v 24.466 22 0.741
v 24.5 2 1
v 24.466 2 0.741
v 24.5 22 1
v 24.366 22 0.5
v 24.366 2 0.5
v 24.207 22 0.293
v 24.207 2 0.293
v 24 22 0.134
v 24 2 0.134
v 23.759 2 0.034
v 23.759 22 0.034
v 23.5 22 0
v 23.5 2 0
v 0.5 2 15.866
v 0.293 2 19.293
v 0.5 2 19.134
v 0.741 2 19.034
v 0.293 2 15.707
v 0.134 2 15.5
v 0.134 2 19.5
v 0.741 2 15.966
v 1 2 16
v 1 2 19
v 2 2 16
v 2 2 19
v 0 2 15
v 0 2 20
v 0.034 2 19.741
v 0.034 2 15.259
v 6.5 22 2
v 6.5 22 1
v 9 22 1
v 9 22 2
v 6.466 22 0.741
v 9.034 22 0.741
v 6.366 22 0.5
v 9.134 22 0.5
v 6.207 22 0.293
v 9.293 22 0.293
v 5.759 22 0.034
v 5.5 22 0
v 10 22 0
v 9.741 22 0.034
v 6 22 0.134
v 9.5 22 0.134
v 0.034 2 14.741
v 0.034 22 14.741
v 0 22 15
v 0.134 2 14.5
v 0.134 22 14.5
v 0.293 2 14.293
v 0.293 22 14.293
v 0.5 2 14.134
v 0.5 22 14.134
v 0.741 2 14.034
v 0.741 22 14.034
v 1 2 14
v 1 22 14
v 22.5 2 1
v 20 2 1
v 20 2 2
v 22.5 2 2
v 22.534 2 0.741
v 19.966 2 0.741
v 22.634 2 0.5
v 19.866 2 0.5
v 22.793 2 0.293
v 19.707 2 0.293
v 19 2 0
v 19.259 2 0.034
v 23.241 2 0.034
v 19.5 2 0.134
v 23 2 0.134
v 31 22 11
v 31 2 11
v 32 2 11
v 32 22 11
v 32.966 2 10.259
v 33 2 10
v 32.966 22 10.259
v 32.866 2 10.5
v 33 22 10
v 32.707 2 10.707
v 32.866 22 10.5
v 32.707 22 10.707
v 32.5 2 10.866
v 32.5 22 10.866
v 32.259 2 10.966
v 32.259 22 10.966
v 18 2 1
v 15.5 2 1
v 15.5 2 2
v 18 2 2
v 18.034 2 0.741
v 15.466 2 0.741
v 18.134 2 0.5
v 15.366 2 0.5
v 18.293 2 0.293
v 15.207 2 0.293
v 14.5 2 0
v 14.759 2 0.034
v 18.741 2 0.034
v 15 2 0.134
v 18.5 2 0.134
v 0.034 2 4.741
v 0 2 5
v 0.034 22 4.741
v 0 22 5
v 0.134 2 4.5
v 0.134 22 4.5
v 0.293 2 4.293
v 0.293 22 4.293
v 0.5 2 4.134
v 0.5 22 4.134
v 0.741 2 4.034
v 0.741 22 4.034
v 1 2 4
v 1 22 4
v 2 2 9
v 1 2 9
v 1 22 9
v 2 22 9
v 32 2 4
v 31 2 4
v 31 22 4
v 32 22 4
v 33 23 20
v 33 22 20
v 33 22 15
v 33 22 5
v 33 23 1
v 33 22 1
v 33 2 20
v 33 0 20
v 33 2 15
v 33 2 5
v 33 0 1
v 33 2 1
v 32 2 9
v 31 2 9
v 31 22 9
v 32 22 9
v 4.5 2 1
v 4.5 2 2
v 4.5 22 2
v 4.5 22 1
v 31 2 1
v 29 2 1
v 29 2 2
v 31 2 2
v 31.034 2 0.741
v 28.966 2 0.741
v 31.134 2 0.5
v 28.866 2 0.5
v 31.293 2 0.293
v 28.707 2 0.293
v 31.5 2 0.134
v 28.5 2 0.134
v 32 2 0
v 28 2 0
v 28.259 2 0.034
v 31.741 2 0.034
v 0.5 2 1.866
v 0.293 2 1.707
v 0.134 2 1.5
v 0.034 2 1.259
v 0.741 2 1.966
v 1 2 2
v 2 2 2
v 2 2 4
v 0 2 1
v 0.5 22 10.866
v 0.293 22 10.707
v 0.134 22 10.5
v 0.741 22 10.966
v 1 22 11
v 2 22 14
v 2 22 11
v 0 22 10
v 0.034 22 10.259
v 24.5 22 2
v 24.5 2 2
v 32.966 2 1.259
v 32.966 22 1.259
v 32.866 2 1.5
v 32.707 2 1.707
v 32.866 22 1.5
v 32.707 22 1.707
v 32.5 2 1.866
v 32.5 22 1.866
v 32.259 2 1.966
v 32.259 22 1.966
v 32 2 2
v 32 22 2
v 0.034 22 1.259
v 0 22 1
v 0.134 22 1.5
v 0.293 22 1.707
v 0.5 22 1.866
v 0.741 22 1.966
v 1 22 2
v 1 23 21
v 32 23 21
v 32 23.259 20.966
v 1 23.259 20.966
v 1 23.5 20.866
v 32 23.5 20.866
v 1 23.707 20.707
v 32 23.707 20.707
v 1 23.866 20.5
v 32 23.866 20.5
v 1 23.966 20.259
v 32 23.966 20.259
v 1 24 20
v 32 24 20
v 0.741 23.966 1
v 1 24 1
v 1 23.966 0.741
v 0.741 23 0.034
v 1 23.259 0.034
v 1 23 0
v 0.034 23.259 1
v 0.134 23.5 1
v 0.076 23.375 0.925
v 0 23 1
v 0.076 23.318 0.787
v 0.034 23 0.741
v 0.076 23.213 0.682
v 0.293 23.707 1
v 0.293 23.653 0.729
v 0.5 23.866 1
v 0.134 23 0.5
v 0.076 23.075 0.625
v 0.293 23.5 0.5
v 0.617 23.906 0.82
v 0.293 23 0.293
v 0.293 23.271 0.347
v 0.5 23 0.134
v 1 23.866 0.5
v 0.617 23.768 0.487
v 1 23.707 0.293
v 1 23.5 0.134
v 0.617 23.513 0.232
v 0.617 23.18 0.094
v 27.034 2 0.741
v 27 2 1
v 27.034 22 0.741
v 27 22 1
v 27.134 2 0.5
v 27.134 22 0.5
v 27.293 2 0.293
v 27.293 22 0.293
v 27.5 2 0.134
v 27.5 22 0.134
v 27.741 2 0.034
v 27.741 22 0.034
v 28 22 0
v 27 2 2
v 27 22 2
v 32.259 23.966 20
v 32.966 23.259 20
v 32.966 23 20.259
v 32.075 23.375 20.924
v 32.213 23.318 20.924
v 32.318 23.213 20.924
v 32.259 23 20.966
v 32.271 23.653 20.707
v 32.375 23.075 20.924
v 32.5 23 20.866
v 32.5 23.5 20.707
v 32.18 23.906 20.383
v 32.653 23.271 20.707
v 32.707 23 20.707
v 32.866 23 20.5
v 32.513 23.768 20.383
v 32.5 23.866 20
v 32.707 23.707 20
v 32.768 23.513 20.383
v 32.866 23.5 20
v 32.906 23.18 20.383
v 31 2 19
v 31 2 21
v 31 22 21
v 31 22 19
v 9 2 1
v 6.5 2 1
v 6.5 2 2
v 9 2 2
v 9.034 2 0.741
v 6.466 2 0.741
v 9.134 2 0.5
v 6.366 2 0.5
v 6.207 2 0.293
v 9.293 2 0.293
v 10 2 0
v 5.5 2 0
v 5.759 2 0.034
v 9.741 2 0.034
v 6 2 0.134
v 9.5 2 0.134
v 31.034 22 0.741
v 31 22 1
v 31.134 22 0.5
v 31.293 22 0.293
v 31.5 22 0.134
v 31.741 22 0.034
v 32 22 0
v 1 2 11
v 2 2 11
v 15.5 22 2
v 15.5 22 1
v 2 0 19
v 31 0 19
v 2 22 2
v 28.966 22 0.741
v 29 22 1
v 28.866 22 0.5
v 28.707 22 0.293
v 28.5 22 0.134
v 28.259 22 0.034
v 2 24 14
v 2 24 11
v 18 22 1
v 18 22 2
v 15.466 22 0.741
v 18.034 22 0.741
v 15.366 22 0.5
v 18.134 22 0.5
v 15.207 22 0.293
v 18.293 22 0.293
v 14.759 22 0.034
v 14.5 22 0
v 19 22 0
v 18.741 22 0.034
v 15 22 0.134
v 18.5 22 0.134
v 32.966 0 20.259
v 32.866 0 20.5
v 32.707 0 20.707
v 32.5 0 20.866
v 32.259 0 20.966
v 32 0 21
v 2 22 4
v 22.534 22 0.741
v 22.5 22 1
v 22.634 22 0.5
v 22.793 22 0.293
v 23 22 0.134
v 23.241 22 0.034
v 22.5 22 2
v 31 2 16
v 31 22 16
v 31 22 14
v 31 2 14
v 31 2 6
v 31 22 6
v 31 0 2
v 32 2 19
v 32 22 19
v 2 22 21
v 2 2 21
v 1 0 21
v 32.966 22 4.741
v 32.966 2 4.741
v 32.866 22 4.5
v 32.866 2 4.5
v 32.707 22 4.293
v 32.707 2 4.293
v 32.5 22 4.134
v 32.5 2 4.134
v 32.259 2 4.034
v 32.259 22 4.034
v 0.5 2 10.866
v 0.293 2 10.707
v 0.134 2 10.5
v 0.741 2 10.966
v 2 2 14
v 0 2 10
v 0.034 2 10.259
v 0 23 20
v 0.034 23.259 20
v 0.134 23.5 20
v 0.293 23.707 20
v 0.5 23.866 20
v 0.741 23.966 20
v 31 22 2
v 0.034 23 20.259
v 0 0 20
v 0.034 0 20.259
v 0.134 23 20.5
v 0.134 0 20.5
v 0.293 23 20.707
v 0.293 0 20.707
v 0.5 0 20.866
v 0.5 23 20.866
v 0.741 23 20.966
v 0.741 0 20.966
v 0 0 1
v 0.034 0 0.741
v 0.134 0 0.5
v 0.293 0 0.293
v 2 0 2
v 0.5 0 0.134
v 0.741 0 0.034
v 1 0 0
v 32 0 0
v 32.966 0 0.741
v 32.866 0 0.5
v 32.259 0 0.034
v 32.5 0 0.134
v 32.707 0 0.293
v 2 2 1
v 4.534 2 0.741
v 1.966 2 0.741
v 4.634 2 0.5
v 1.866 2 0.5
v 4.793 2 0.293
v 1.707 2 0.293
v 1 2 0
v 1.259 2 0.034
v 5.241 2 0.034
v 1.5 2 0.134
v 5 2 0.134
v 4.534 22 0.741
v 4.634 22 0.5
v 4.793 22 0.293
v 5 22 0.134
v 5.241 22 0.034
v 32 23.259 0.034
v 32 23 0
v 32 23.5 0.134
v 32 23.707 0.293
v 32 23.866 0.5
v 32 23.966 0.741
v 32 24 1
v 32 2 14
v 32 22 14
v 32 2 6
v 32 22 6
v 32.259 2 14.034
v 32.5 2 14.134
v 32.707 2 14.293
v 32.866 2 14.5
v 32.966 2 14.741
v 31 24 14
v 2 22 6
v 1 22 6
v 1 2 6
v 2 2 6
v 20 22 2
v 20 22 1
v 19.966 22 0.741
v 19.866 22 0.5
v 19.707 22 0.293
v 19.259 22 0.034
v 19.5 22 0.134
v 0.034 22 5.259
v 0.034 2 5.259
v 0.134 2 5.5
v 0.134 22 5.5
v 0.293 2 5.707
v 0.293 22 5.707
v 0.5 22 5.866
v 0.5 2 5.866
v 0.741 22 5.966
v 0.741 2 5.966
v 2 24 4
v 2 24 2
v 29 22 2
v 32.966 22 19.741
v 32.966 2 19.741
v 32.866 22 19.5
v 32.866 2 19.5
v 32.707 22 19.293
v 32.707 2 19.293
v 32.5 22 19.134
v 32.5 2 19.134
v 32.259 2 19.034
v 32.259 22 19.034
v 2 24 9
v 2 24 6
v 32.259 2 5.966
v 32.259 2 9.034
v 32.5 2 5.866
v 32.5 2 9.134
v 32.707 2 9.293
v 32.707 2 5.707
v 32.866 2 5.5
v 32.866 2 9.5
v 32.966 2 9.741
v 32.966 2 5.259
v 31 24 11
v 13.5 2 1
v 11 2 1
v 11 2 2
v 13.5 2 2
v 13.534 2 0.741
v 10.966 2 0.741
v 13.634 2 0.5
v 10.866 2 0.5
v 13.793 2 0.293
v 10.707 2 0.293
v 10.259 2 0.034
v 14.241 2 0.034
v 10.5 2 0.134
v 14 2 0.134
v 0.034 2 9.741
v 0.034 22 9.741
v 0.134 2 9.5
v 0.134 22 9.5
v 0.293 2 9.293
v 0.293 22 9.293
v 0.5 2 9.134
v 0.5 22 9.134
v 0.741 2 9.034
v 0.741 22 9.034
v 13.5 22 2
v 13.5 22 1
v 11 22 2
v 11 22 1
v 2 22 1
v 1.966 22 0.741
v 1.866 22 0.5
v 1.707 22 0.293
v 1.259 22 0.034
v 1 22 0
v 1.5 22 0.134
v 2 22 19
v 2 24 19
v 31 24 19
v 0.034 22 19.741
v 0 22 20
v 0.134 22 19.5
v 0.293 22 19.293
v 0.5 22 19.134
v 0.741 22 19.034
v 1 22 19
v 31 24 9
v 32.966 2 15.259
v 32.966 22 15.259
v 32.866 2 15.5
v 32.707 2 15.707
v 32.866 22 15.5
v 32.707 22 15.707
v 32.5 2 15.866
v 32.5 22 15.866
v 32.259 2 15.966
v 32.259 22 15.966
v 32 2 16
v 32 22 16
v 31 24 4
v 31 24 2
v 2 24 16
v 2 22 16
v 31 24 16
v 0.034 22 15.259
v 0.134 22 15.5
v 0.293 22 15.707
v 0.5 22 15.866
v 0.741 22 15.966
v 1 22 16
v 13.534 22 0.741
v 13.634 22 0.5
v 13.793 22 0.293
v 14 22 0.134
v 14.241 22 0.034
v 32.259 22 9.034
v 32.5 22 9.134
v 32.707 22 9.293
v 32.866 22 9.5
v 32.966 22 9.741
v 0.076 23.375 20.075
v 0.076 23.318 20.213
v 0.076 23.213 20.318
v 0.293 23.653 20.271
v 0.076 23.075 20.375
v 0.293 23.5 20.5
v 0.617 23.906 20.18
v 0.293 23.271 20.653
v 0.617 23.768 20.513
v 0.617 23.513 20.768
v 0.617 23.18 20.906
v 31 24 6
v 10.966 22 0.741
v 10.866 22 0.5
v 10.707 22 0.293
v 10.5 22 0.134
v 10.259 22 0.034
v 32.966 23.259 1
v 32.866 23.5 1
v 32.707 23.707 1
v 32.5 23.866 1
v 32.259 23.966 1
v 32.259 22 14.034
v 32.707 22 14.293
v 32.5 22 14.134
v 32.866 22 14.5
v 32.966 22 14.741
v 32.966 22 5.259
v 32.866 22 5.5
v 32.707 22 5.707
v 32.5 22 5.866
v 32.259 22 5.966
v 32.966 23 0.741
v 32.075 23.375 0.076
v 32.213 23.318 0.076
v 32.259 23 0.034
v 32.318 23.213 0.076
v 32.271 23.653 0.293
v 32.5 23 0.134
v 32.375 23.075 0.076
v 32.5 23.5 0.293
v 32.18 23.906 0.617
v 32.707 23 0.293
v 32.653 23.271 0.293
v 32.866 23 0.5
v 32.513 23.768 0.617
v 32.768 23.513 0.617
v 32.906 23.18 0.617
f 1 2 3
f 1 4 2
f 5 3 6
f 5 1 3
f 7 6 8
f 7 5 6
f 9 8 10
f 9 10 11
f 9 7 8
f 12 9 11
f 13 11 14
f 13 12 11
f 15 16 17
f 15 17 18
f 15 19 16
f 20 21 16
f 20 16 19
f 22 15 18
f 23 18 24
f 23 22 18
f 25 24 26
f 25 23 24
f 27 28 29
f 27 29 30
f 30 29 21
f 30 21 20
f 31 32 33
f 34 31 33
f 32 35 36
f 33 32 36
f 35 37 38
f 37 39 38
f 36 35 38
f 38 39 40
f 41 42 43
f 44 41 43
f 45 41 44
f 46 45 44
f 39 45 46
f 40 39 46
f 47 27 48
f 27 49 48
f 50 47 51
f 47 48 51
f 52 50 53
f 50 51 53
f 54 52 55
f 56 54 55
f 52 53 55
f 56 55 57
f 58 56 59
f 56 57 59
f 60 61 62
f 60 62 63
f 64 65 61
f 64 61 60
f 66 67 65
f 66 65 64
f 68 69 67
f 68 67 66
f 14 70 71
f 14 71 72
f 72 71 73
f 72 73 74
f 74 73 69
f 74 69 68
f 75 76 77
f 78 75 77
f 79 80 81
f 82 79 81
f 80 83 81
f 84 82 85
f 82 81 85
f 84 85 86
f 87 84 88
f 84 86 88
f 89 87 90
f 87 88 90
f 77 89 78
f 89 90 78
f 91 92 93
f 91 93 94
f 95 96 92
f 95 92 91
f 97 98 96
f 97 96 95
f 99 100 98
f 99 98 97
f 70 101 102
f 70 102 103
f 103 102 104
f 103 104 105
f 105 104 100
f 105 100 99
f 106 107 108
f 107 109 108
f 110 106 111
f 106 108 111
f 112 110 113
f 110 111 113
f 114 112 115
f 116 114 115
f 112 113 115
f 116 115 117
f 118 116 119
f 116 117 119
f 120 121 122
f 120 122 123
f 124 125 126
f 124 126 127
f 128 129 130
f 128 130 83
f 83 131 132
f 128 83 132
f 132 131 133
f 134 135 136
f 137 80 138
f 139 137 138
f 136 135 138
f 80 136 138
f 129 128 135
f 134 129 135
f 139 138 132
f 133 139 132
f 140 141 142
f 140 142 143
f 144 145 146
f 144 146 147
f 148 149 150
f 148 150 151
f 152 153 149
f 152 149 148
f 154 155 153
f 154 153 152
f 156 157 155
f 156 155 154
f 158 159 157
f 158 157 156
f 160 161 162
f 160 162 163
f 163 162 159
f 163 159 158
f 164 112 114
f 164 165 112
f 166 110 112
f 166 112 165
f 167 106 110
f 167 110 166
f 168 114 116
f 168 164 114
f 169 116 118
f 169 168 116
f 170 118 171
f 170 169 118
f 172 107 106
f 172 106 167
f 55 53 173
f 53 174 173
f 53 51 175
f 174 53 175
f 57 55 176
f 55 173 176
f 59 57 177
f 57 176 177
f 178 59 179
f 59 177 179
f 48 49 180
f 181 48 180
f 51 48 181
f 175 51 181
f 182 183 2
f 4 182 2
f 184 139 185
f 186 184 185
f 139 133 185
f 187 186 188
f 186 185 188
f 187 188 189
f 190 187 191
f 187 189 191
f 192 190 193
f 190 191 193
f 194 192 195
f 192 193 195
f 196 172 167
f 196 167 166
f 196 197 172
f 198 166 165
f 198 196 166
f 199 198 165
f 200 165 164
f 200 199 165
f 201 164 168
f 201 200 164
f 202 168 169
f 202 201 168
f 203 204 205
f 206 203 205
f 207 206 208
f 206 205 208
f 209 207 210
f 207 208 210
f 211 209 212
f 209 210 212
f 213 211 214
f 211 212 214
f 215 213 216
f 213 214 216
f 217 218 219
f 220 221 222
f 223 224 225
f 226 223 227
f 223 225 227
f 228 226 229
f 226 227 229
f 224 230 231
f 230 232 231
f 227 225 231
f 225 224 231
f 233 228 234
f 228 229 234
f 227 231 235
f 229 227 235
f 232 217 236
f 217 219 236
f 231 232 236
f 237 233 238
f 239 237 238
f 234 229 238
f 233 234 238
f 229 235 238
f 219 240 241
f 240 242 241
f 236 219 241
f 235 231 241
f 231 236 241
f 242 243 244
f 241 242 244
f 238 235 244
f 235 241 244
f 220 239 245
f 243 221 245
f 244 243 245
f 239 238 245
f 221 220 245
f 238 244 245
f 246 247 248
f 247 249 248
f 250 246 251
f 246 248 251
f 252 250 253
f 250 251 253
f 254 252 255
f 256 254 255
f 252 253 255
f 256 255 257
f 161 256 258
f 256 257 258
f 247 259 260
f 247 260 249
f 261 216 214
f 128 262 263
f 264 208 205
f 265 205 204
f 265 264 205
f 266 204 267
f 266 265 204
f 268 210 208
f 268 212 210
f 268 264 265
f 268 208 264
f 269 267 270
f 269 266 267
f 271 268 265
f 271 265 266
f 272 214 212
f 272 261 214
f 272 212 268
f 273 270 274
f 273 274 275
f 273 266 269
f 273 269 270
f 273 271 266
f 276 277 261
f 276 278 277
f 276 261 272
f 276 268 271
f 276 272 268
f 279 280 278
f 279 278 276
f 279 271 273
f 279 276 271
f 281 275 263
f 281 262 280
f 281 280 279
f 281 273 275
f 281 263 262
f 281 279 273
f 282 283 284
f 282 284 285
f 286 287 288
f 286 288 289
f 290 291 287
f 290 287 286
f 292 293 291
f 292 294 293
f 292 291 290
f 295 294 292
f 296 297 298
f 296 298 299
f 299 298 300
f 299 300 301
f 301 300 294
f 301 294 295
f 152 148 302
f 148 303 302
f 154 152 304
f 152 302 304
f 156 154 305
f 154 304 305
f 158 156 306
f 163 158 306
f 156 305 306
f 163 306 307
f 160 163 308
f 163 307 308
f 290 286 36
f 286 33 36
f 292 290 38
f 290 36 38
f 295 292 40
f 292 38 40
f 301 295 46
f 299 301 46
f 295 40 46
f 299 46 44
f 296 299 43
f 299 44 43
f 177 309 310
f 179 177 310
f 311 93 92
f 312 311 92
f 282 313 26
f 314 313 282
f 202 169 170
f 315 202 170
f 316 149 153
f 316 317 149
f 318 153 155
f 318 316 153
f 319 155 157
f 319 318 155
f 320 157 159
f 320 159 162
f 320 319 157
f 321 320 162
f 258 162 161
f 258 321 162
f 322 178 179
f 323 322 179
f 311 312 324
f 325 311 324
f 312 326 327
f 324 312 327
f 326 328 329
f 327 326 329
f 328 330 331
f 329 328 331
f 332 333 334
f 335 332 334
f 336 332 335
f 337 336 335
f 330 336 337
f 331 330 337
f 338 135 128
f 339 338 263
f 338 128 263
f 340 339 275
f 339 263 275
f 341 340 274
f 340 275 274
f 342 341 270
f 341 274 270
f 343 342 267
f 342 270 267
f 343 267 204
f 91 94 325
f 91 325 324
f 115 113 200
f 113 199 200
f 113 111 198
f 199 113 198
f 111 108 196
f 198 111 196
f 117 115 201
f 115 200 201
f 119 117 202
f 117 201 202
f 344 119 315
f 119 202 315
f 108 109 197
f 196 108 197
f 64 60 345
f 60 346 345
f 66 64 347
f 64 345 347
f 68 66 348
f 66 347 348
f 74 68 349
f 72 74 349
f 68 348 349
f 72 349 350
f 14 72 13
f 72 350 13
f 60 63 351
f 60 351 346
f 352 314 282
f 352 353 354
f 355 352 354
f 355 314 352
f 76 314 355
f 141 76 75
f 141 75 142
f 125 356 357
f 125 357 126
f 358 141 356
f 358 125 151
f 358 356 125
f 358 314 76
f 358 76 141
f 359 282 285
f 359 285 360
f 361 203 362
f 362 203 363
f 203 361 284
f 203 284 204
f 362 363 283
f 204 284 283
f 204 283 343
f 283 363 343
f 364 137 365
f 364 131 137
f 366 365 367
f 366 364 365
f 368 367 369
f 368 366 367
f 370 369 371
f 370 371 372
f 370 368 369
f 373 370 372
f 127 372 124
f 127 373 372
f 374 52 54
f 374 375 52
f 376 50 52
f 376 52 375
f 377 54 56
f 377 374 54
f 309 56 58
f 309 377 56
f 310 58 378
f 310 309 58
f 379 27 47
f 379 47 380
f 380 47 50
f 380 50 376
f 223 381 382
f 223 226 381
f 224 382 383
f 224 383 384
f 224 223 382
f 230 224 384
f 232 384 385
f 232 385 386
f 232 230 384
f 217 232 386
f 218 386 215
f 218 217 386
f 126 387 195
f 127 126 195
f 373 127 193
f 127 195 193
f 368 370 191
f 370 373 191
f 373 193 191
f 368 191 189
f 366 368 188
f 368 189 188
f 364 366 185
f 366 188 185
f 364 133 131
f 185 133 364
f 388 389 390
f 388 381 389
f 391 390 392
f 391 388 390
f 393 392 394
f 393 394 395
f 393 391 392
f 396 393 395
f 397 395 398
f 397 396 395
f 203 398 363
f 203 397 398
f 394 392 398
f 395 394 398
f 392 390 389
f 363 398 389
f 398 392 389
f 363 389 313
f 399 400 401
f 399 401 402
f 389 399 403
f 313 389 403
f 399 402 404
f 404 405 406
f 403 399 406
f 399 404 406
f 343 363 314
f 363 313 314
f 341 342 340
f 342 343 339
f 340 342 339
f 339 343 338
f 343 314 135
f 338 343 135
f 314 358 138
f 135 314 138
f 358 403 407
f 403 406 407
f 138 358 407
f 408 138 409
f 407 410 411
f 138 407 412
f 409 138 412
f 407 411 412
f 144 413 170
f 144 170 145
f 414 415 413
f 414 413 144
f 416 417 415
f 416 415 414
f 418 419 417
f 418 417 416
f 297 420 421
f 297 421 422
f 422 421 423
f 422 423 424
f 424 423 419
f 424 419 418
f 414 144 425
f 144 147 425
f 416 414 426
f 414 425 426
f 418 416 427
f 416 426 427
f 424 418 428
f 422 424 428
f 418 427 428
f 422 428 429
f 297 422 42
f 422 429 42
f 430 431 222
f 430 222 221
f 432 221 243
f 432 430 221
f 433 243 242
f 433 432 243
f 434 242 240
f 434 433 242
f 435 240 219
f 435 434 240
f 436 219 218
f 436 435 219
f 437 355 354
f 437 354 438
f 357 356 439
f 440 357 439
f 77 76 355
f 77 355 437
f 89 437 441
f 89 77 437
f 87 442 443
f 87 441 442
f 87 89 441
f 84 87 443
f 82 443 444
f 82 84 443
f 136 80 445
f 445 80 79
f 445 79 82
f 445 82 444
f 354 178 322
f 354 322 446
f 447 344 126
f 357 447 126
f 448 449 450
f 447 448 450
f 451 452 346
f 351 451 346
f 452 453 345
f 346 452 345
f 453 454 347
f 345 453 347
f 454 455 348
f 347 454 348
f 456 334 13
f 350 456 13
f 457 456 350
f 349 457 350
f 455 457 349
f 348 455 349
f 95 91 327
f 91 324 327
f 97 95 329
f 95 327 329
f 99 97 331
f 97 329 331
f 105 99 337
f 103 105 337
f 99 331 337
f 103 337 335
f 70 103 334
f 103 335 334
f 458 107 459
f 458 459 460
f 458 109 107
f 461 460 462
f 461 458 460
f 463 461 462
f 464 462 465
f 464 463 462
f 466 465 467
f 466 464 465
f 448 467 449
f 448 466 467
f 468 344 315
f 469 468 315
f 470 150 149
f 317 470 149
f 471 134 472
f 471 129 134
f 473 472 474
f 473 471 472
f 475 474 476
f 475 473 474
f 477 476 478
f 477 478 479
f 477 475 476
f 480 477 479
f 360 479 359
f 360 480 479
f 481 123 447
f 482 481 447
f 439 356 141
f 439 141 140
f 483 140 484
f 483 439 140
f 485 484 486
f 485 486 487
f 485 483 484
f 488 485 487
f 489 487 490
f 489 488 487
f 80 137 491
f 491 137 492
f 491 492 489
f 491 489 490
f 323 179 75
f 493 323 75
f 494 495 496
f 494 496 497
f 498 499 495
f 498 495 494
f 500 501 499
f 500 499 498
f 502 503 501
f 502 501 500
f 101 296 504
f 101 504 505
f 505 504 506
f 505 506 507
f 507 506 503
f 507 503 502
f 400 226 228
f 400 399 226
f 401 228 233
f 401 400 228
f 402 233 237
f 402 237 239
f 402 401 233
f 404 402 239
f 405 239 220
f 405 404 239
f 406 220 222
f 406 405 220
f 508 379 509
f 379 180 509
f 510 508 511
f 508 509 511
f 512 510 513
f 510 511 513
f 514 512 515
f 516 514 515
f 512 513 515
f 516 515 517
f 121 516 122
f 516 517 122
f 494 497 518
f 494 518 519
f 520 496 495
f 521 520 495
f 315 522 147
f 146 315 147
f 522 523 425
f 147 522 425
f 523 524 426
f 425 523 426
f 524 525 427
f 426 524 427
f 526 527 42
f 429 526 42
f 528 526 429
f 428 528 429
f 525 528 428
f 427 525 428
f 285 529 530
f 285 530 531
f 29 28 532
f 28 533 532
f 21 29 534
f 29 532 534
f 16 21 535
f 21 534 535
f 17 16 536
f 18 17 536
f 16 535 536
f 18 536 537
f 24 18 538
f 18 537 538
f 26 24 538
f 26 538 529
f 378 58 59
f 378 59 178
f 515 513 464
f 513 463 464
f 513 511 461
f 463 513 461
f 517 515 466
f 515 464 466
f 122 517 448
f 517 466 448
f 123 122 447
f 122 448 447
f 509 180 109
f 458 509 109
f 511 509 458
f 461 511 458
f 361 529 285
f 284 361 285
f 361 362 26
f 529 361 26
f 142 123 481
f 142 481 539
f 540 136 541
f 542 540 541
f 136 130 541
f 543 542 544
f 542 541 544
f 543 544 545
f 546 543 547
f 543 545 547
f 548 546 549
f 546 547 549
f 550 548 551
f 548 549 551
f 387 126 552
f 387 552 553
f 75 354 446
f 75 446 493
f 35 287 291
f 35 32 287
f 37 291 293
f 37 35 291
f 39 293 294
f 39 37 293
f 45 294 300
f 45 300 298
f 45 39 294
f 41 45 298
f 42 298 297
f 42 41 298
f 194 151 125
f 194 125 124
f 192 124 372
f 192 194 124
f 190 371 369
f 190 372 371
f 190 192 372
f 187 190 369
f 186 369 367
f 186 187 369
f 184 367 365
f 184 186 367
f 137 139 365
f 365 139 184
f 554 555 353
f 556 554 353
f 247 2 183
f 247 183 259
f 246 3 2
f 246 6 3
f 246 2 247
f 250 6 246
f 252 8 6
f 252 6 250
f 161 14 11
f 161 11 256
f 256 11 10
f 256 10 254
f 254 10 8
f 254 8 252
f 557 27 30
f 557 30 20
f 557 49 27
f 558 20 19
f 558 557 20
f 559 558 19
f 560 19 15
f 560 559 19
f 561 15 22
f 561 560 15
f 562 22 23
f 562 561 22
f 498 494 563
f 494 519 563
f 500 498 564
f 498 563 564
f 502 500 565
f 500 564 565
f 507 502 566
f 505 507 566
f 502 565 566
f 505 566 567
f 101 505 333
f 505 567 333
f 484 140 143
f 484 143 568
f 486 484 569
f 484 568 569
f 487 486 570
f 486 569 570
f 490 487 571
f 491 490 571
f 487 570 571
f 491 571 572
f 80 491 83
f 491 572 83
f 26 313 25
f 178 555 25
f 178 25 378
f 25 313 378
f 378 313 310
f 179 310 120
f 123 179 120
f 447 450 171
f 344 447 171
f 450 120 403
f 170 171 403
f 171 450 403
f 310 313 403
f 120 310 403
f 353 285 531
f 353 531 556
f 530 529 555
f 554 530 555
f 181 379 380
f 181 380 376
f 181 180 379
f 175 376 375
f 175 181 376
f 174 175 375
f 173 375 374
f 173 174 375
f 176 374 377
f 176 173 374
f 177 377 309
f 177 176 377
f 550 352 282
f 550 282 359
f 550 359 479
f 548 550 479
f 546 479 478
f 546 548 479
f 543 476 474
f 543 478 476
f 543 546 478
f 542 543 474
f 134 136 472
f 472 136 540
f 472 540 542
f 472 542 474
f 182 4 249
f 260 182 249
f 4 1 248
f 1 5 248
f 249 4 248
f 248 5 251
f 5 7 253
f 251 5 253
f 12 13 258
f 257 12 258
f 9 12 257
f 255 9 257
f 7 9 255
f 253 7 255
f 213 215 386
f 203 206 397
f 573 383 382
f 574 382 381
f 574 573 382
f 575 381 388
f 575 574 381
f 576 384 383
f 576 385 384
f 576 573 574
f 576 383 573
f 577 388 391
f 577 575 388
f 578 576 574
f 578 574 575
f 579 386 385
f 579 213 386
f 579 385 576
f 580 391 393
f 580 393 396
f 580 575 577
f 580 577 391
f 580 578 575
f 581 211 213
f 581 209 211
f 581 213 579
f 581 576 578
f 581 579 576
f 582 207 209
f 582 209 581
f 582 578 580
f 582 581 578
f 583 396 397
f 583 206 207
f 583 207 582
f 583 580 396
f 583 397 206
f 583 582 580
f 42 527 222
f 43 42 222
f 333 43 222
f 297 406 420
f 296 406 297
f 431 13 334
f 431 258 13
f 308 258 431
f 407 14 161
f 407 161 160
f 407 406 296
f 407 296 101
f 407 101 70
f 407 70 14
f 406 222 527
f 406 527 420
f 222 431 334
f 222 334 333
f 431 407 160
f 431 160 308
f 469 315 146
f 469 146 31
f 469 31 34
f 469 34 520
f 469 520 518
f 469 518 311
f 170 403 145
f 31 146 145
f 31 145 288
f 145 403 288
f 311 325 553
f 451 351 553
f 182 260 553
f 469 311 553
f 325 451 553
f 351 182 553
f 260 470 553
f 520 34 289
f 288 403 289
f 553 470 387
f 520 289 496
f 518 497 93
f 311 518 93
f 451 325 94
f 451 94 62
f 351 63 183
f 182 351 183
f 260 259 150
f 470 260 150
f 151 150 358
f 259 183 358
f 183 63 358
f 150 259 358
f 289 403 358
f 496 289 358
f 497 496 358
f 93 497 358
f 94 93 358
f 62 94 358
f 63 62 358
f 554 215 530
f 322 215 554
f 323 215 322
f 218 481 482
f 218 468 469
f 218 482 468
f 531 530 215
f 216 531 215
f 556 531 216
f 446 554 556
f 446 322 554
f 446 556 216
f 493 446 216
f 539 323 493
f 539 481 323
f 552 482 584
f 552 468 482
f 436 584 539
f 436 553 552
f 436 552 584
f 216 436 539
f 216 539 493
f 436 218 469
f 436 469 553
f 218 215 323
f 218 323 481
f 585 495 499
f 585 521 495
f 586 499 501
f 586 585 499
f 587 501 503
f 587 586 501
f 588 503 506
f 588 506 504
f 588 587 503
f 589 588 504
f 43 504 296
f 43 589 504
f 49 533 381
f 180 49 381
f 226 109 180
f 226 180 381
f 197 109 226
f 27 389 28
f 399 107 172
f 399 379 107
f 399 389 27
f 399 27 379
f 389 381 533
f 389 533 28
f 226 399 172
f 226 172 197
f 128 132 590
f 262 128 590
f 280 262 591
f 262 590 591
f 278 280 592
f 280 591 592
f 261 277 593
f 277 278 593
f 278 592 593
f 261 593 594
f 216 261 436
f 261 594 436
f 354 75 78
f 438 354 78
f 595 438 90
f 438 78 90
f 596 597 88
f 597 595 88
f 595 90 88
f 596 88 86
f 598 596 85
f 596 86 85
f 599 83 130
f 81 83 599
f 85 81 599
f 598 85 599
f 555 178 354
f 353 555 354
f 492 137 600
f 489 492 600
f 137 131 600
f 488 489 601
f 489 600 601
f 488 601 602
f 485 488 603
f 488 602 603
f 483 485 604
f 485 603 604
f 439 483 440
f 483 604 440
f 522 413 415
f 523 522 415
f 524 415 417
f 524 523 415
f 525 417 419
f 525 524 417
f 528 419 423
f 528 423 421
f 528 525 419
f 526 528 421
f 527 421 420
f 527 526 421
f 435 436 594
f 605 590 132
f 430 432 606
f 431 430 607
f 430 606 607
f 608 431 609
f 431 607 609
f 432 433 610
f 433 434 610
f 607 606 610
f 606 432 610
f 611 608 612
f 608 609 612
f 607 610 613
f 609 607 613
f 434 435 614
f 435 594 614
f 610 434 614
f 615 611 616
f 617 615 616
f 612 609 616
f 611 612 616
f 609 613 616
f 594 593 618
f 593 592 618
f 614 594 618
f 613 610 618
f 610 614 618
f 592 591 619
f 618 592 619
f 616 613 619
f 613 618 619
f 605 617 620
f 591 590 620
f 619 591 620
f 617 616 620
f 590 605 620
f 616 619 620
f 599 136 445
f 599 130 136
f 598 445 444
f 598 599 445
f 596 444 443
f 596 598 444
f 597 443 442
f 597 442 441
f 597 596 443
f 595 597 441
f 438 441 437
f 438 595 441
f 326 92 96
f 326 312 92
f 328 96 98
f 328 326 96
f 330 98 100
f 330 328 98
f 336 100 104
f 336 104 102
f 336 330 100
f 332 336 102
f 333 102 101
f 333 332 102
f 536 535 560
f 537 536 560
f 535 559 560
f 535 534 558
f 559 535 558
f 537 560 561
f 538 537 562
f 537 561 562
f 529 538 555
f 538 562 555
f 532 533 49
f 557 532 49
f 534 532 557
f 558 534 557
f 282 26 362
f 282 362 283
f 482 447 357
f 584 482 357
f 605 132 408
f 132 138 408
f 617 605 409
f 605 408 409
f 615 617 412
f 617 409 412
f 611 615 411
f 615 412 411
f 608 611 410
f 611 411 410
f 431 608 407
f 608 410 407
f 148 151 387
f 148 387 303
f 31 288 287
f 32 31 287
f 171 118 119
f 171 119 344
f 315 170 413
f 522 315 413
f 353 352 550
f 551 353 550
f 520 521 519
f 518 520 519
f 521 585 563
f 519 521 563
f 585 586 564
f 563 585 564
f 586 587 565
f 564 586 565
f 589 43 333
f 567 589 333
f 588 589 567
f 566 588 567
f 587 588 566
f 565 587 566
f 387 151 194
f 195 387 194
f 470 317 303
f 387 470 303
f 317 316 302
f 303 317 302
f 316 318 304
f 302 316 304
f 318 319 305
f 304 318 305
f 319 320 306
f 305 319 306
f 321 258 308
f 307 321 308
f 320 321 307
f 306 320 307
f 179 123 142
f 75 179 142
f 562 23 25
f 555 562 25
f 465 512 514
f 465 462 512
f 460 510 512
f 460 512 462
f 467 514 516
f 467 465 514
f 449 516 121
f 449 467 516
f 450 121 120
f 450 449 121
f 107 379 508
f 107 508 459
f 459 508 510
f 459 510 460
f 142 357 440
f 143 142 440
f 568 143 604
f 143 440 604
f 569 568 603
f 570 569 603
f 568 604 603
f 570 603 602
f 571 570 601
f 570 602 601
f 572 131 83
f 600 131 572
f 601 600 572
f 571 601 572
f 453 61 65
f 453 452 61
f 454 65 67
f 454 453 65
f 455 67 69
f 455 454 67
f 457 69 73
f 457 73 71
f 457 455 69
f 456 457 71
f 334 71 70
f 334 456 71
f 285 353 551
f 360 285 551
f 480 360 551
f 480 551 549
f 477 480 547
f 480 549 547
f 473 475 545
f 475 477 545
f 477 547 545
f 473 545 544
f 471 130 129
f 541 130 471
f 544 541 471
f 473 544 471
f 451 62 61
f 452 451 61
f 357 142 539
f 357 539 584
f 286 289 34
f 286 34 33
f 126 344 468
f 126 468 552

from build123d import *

# Parameters (mm, degrees)
SKETCH_1_W      = 33
SKETCH_1_H      = 21
SKETCH_1_W_2    = 29
SKETCH_1_H_2    = 17
EXTRUDE_1_DEPTH = 2
SKETCH_2_W      = 2
SKETCH_2_H      = 2
EXTRUDE_2_DEPTH = 20
SKETCH_3_W      = 33
SKETCH_3_H      = 21
SKETCH_3_W_2    = 29
SKETCH_3_H_2    = 2
SKETCH_3_H_3    = 3
EXTRUDE_6_DEPTH = 2
FILLET_2_R      = 1


with BuildPart() as part:
    # 草图1 → 凸台-拉伸1 (new body)
    with BuildSketch(Plane(origin=(0, 0, 0), x_dir=(1, 0, 0), z_dir=(0, 1, 0))):
        with Locations((16.5, -10.5)):
            Rectangle(SKETCH_1_W, SKETCH_1_H)
        with Locations((16.5, -10.5)):
            Rectangle(SKETCH_1_W_2, SKETCH_1_H_2, mode=Mode.SUBTRACT)
    extrude(amount=EXTRUDE_1_DEPTH)

    # 草图2 → 凸台-拉伸2 (add)
    with BuildSketch(Plane(origin=(0, 2, 0), x_dir=(1, 0, 0), z_dir=(0, 1, 0))):
        with Locations((1, -15)):
            Rectangle(SKETCH_2_W, SKETCH_2_H)
        with Locations((1, -20)):
            Rectangle(SKETCH_2_W, SKETCH_2_H)
        with Locations((1, -1)):
            Rectangle(SKETCH_2_W, SKETCH_2_H)
        with Locations((32, -1)):
            Rectangle(SKETCH_2_W, SKETCH_2_H)
        with Locations((32, -20)):
            Rectangle(SKETCH_2_W, SKETCH_2_H)
        with Locations((32, -15)):
            Rectangle(SKETCH_2_W, SKETCH_2_H)
        with Locations((1, -10)):
            Rectangle(SKETCH_2_W, SKETCH_2_H)
        with Locations((32, -10)):
            Rectangle(SKETCH_2_W, SKETCH_2_H)
        with Locations((1, -5)):
            Rectangle(SKETCH_2_W, SKETCH_2_H)
        with Locations((32, -5)):
            Rectangle(SKETCH_2_W, SKETCH_2_H)
        with Locations((5.5, -1)):
            Rectangle(SKETCH_2_W, SKETCH_2_H)
        with Locations((10, -1)):
            Rectangle(SKETCH_2_W, SKETCH_2_H)
        with Locations((14.5, -1)):
            Rectangle(SKETCH_2_W, SKETCH_2_H)
        with Locations((19, -1)):
            Rectangle(SKETCH_2_W, SKETCH_2_H)
        with Locations((23.5, -1)):
            Rectangle(SKETCH_2_W, SKETCH_2_H)
        with Locations((28, -1)):
            Rectangle(SKETCH_2_W, SKETCH_2_H)
    extrude(amount=EXTRUDE_2_DEPTH)

    # 草图3 → 凸台-拉伸6 (add)
    with BuildSketch(Plane(origin=(0, 22, 0), x_dir=(1, 0, 0), z_dir=(0, 1, 0))):
        with Locations((16.5, -10.5)):
            Rectangle(SKETCH_3_W, SKETCH_3_H)
        with Locations((16.5, -3)):
            Rectangle(SKETCH_3_W_2, SKETCH_3_H_2, mode=Mode.SUBTRACT)
        with Locations((16.5, -7.5)):
            Rectangle(SKETCH_3_W_2, SKETCH_3_H_3, mode=Mode.SUBTRACT)
        with Locations((16.5, -12.5)):
            Rectangle(SKETCH_3_W_2, SKETCH_3_H_3, mode=Mode.SUBTRACT)
        with Locations((16.5, -17.5)):
            Rectangle(SKETCH_3_W_2, SKETCH_3_H_3, mode=Mode.SUBTRACT)
    extrude(amount=EXTRUDE_6_DEPTH)

    # 圆角2
    fillet_2_edges = [part.edges().sort_by_distance(p)[0] for p in [
        (33, 12, 11),
        (33, 12, 9),
        (0, 12, 4),
        (0, 12, 6),
        (33, 12, 6),
        (33, 12, 4),
        (6.5, 12, 0),
        (4.5, 12, 0),
        (11, 12, 0),
        (9, 12, 0),
        (15.5, 12, 0),
        (13.5, 12, 0),
        (20, 12, 0),
        (18, 12, 0),
        (24.5, 12, 0),
        (22.5, 12, 0),
        (29, 12, 0),
        (27, 12, 0),
        (33, 24, 10.5),
        (16.5, 24, 0),
        (16.5, 24, 21),
        (0, 24, 10.5),
        (0, 12, 19),
        (0, 12, 2),
        (2, 12, 0),
        (33, 12, 2),
        (31, 12, 0),
        (33, 12, 19),
        (0, 12, 14),
        (0, 12, 16),
        (0, 12, 0),
        (33, 12, 0),
        (33, 12, 21),
        (0, 12, 21),
        (33, 12, 16),
        (33, 12, 14),
        (0, 12, 9),
        (0, 12, 11),
    ]]
    fillet(fillet_2_edges, radius=FILLET_2_R - 0.0001)  # a hair under: the kernel refuses the full size


solid = part.part
